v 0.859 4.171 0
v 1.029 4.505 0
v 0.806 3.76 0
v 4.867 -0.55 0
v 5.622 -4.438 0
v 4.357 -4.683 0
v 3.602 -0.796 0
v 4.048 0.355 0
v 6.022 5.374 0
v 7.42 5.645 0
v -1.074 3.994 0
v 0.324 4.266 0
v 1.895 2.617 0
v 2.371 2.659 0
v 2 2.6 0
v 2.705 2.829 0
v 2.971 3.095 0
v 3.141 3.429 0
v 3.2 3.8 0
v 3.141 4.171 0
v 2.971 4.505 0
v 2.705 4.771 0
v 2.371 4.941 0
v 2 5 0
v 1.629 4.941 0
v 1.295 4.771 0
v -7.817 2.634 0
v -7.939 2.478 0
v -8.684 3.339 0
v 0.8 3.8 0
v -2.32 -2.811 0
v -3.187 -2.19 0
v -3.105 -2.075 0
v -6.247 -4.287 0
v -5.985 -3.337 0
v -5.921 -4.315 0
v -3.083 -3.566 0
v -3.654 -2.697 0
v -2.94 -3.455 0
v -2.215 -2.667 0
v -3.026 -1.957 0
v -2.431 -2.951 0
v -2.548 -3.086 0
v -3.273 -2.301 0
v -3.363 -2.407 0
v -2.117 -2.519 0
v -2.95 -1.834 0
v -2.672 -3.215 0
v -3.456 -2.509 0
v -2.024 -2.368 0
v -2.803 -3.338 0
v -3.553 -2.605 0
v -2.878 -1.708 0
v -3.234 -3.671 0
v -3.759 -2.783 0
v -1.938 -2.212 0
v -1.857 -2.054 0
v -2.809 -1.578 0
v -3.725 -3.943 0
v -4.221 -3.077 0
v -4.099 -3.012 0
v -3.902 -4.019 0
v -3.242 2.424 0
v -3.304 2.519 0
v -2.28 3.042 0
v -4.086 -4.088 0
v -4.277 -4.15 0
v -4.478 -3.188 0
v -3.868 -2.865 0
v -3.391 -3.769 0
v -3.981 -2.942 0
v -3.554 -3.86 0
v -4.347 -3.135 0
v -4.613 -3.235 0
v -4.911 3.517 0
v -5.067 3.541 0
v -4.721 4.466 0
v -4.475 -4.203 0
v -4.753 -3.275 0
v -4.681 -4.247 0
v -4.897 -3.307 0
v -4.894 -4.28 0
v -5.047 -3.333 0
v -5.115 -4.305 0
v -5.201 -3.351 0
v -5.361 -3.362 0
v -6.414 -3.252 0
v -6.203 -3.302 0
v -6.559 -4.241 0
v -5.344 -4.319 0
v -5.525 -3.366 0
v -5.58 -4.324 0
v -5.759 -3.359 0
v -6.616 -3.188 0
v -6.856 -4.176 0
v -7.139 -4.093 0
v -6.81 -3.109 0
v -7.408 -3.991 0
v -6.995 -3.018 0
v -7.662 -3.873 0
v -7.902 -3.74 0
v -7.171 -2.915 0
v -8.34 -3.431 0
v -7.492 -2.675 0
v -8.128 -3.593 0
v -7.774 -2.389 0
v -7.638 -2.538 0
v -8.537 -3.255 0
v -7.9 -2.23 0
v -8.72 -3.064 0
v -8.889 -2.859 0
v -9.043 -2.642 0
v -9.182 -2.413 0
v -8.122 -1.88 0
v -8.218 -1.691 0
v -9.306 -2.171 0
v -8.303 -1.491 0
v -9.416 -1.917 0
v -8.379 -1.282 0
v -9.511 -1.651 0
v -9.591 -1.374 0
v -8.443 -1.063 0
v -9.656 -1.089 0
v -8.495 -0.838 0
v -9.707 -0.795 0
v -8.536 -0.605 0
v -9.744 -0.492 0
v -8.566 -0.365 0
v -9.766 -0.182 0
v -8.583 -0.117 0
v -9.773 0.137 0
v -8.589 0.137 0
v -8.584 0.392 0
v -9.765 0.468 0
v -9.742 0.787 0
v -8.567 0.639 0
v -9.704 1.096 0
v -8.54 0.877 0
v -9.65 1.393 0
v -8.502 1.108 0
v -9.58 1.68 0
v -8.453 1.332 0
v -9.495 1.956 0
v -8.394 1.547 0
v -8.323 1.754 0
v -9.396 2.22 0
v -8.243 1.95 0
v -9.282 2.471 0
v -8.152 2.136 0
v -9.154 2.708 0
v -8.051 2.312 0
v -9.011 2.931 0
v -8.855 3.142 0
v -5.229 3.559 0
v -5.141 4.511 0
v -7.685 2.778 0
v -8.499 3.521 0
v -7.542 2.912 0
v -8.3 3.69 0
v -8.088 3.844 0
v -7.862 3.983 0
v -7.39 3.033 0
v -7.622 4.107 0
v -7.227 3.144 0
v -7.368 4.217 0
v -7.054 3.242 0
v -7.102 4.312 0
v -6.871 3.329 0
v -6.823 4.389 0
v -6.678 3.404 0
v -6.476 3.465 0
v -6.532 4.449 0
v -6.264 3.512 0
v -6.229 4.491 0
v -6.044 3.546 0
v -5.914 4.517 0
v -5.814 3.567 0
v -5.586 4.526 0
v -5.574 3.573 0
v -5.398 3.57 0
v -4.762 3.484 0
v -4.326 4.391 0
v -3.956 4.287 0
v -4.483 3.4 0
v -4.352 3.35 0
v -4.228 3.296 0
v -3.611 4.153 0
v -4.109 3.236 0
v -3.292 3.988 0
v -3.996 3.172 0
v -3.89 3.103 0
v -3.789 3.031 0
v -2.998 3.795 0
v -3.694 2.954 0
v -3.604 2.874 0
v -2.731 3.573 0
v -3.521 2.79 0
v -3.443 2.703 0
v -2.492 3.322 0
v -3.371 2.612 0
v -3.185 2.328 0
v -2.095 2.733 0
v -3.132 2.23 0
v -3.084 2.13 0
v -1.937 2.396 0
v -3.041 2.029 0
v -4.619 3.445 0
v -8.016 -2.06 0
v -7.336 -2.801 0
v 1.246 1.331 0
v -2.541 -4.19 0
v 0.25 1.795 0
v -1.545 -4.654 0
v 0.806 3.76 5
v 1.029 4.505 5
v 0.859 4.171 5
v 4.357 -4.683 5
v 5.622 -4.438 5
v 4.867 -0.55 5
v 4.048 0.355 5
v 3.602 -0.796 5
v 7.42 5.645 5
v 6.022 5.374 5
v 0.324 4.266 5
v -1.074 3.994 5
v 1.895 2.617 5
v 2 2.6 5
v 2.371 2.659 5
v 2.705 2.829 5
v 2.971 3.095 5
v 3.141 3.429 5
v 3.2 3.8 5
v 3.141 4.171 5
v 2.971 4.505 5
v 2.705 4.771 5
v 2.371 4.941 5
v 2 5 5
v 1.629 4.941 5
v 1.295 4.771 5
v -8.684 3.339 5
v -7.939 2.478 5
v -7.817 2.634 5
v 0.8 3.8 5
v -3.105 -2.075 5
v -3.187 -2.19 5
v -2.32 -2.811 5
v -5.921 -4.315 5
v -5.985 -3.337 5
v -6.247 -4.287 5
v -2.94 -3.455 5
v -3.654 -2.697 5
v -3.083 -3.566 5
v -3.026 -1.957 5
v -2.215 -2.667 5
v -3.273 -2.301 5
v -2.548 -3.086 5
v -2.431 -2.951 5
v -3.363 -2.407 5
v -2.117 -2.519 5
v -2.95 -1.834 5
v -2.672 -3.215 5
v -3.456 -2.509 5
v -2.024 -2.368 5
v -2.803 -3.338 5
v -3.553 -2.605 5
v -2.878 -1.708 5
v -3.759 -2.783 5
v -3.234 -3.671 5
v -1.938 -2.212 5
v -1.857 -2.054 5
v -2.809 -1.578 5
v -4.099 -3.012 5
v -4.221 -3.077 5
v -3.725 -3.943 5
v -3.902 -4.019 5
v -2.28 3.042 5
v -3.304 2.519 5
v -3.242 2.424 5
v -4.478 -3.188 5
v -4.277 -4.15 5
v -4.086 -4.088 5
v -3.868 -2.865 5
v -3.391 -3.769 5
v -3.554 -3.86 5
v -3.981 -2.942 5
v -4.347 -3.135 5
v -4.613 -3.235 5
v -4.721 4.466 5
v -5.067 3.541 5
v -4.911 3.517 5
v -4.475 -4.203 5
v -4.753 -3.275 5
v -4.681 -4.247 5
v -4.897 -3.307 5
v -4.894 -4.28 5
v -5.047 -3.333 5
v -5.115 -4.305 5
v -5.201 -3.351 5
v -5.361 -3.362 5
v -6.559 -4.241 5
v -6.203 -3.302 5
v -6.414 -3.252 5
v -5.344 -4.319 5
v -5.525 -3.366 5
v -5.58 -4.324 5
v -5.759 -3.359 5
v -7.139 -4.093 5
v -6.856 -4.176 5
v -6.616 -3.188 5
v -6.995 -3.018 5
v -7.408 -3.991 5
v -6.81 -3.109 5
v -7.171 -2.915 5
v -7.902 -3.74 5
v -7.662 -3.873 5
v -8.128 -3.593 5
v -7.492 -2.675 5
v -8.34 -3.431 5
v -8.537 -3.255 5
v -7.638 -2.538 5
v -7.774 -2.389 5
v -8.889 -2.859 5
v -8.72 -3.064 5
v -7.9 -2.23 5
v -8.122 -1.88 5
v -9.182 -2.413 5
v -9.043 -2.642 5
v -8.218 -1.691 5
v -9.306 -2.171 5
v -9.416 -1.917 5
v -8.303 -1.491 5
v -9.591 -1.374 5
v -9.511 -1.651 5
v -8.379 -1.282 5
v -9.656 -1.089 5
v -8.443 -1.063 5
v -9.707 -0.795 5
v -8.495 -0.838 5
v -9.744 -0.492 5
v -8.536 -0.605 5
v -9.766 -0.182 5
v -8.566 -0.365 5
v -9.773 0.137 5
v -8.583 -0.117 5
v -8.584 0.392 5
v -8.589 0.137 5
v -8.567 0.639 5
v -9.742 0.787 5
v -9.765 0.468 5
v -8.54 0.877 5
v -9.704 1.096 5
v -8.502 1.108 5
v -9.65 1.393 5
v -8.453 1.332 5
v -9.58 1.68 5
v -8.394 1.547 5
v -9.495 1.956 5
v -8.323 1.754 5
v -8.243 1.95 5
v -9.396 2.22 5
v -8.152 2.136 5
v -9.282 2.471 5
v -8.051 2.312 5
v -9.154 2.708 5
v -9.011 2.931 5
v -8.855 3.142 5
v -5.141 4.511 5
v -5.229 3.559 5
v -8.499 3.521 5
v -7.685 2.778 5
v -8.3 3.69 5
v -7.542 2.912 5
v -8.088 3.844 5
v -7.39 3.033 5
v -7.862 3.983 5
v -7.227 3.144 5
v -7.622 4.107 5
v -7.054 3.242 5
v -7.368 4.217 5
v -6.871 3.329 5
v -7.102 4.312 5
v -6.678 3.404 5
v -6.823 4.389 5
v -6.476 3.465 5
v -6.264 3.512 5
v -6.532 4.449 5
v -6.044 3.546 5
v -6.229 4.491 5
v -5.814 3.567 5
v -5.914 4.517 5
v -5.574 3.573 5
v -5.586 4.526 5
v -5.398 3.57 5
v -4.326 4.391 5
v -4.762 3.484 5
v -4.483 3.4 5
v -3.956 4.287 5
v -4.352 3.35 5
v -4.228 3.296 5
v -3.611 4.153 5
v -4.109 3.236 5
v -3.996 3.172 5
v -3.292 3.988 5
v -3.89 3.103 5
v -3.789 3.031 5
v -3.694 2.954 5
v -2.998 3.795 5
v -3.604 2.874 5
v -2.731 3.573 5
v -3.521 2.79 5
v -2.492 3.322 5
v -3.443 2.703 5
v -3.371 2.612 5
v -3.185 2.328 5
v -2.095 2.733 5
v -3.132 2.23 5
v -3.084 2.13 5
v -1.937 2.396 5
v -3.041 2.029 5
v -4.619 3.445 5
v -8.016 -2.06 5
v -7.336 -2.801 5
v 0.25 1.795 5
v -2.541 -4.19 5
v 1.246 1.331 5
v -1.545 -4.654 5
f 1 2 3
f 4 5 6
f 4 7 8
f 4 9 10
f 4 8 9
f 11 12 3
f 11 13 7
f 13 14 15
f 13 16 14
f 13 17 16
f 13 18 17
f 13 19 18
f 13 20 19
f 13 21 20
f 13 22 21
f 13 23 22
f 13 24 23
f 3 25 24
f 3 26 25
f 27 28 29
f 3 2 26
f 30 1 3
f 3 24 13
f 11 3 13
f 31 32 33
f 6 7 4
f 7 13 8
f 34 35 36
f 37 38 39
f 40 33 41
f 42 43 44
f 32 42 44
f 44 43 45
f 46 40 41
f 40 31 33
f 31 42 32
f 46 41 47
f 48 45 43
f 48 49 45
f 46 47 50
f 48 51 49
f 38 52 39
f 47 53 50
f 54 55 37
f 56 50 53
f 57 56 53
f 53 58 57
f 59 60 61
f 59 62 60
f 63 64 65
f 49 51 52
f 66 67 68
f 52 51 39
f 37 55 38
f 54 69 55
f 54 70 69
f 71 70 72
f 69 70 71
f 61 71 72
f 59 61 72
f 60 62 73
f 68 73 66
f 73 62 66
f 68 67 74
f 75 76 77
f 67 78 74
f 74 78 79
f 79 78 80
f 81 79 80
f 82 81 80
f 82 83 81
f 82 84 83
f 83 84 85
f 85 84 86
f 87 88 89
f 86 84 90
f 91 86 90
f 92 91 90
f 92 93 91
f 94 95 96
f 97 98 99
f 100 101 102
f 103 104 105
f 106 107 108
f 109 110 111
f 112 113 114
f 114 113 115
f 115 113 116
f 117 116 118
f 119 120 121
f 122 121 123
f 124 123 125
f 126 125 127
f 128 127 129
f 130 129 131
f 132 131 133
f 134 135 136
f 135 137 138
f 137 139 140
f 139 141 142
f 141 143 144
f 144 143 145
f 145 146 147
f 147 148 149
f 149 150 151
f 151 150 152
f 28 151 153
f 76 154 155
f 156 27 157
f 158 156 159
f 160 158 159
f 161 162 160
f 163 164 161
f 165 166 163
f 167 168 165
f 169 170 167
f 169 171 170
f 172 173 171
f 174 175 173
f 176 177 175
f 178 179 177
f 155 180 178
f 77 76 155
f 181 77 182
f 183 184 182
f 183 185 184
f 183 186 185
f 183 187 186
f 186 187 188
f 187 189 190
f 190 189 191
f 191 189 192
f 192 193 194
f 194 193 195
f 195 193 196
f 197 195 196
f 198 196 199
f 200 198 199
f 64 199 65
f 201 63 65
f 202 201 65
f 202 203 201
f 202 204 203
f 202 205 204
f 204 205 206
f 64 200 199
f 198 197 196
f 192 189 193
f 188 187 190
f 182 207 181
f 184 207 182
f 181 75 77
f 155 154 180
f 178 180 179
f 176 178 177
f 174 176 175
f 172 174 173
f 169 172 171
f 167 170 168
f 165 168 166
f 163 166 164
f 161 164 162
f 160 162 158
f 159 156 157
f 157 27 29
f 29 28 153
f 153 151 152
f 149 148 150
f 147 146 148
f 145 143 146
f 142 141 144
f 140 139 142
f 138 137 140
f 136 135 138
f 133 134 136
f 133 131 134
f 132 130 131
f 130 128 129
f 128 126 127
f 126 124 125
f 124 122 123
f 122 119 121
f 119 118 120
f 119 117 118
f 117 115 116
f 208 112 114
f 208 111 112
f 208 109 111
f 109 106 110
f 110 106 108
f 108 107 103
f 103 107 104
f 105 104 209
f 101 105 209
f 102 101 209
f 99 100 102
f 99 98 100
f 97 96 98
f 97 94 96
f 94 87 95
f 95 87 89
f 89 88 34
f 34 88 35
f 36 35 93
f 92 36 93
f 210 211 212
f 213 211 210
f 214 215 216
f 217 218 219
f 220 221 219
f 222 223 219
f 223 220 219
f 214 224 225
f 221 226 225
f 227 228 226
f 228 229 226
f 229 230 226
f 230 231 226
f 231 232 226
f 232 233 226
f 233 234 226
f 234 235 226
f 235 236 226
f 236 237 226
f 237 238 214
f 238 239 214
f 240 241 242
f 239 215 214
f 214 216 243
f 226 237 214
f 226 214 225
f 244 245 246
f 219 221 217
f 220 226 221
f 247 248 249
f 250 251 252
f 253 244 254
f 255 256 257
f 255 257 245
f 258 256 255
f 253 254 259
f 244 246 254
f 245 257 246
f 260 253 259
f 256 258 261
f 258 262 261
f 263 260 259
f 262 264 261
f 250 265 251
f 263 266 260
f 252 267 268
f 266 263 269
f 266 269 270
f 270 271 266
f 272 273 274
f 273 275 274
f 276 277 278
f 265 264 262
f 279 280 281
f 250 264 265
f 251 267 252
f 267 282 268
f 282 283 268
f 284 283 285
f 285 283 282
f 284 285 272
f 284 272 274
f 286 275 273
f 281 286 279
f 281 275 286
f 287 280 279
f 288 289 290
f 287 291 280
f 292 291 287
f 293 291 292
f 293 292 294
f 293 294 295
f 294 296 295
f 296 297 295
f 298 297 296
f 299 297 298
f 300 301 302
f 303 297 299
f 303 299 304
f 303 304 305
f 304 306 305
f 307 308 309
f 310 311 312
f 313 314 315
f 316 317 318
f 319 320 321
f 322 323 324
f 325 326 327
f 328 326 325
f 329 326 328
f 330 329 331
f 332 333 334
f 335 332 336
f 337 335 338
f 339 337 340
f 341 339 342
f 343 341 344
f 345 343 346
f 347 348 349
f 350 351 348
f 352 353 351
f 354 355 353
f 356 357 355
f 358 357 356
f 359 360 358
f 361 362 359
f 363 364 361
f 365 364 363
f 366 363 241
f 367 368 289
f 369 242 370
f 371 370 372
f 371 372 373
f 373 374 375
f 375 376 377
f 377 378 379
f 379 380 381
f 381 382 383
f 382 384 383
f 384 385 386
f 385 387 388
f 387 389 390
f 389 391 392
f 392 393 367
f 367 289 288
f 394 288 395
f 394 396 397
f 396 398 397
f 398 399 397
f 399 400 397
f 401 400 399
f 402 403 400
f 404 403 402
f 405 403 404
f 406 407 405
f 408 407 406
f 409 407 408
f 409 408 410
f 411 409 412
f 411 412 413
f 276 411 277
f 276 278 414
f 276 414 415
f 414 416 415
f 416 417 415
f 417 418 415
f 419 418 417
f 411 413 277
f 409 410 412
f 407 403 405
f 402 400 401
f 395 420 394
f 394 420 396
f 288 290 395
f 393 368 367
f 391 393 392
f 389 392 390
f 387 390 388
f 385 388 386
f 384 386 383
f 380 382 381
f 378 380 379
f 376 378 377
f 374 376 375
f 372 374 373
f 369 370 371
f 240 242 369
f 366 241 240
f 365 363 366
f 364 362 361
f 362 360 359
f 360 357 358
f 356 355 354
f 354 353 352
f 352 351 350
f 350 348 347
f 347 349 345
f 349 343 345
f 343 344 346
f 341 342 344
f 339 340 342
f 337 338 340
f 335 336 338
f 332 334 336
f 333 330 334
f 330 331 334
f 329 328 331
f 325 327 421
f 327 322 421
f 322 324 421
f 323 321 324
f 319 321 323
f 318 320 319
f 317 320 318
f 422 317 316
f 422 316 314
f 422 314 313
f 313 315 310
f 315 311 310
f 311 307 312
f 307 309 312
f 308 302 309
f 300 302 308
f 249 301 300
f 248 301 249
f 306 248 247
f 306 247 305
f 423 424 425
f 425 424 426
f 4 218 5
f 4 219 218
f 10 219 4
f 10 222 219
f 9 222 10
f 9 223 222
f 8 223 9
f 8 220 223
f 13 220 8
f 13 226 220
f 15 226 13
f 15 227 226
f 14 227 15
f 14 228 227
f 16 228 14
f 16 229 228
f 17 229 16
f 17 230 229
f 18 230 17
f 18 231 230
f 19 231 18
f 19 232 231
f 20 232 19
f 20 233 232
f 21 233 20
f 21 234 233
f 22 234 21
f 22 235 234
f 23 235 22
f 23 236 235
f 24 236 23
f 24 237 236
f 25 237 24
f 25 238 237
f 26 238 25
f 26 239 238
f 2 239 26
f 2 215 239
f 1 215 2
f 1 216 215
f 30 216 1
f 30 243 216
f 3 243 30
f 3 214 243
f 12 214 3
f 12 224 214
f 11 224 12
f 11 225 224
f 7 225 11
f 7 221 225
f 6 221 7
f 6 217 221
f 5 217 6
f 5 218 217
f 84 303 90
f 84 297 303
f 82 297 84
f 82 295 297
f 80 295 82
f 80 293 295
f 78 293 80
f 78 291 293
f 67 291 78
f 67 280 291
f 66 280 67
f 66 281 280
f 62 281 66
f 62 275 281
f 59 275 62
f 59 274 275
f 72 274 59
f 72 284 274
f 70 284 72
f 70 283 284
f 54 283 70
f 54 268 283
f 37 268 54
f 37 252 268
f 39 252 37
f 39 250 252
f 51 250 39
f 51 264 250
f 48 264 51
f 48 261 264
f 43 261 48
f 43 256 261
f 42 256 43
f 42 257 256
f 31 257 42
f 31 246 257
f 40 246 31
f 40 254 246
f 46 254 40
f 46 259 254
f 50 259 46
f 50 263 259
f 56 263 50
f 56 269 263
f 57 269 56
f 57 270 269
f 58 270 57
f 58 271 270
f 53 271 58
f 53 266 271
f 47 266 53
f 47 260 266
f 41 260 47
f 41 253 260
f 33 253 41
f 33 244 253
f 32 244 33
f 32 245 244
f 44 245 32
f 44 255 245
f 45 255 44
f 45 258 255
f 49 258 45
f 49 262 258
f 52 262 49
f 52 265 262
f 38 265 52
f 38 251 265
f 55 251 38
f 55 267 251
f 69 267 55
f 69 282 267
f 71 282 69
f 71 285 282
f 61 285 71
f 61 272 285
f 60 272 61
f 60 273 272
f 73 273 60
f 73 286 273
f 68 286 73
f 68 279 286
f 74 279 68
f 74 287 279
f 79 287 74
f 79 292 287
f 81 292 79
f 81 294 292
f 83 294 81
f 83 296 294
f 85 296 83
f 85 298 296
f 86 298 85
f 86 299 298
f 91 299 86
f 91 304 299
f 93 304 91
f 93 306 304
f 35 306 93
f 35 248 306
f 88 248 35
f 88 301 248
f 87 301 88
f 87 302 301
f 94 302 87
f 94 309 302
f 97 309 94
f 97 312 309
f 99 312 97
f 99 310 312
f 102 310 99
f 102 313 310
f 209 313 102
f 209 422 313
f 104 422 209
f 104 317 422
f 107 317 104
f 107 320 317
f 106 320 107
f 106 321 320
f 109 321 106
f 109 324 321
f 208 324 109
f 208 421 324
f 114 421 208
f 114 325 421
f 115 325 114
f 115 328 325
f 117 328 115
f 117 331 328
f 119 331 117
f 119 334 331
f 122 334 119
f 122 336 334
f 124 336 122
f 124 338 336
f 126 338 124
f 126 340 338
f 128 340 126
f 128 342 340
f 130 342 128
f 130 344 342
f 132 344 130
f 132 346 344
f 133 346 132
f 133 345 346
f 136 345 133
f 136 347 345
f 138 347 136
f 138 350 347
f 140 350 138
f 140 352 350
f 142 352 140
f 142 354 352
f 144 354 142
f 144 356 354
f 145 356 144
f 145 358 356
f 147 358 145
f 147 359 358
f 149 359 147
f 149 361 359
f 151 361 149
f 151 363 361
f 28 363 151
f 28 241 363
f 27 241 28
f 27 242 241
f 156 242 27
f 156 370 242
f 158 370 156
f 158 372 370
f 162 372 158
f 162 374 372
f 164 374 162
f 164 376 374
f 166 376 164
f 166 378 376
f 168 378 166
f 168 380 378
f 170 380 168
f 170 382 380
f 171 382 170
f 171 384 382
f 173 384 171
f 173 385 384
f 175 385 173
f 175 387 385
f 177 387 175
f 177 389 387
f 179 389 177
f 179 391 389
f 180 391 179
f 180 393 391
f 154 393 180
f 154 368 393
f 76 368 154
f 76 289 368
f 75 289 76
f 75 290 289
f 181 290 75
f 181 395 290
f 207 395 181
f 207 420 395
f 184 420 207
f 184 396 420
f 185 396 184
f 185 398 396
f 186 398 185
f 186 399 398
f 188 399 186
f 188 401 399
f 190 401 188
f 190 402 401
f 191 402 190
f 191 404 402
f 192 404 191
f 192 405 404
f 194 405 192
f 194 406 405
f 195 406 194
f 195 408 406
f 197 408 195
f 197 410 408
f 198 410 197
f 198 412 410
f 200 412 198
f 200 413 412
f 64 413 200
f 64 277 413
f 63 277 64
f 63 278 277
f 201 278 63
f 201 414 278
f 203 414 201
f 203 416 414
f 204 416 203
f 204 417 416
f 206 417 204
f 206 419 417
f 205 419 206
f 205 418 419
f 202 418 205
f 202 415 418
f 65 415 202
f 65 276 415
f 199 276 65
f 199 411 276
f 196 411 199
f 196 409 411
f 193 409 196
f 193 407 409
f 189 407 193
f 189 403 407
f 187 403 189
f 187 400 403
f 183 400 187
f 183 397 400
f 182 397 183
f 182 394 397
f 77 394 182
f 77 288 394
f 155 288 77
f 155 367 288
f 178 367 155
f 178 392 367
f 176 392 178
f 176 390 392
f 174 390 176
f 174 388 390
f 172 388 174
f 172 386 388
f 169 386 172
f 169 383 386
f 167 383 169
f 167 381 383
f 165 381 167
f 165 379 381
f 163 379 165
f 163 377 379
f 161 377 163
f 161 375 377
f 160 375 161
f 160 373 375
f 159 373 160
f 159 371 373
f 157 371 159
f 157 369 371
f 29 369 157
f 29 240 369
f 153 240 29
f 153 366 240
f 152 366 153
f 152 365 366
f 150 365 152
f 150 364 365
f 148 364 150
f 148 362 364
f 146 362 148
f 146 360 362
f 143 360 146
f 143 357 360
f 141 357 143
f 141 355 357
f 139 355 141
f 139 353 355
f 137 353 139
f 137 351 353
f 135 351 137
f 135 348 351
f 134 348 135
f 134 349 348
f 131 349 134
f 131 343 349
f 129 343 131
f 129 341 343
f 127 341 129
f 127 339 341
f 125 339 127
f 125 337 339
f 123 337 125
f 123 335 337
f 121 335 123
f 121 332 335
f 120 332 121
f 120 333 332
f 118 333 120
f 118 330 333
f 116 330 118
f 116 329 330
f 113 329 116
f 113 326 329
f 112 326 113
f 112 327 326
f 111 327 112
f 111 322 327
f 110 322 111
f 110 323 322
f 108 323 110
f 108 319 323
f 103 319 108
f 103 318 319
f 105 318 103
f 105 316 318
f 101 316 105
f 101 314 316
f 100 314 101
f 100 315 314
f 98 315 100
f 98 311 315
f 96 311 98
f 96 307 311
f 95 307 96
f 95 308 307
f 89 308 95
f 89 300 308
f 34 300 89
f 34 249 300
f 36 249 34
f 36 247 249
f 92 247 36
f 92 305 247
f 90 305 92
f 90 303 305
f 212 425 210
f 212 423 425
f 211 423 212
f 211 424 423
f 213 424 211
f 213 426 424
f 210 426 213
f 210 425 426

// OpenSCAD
ciy_logo(logo_size = 10, logo_height = 5);

module ciy_logo(logo_size = 5, logo_height) {
    scale ([logo_size/5, logo_size/5 , 1]) {
        linear_extrude(height= logo_height, center = false){
            translate([-3,0,0]){
                text("C", halign = "center", valign = "center", size = 4.5, $fn = 40);
            }
            translate([-0.1, -0.2,0]){
                rotate([0,0,-25]){
                    text("i", halign = "center", valign = "center", size = 4.5);
                }
            }
            translate([2,0,0]){
                rotate([0,0,11]){
                    text("Y", halign = "center", valign = "center", size = 5);
                }
            }
            translate([1,1.9,0]){
                circle(0.6,$fn=20);
            }
        }
    }
}
